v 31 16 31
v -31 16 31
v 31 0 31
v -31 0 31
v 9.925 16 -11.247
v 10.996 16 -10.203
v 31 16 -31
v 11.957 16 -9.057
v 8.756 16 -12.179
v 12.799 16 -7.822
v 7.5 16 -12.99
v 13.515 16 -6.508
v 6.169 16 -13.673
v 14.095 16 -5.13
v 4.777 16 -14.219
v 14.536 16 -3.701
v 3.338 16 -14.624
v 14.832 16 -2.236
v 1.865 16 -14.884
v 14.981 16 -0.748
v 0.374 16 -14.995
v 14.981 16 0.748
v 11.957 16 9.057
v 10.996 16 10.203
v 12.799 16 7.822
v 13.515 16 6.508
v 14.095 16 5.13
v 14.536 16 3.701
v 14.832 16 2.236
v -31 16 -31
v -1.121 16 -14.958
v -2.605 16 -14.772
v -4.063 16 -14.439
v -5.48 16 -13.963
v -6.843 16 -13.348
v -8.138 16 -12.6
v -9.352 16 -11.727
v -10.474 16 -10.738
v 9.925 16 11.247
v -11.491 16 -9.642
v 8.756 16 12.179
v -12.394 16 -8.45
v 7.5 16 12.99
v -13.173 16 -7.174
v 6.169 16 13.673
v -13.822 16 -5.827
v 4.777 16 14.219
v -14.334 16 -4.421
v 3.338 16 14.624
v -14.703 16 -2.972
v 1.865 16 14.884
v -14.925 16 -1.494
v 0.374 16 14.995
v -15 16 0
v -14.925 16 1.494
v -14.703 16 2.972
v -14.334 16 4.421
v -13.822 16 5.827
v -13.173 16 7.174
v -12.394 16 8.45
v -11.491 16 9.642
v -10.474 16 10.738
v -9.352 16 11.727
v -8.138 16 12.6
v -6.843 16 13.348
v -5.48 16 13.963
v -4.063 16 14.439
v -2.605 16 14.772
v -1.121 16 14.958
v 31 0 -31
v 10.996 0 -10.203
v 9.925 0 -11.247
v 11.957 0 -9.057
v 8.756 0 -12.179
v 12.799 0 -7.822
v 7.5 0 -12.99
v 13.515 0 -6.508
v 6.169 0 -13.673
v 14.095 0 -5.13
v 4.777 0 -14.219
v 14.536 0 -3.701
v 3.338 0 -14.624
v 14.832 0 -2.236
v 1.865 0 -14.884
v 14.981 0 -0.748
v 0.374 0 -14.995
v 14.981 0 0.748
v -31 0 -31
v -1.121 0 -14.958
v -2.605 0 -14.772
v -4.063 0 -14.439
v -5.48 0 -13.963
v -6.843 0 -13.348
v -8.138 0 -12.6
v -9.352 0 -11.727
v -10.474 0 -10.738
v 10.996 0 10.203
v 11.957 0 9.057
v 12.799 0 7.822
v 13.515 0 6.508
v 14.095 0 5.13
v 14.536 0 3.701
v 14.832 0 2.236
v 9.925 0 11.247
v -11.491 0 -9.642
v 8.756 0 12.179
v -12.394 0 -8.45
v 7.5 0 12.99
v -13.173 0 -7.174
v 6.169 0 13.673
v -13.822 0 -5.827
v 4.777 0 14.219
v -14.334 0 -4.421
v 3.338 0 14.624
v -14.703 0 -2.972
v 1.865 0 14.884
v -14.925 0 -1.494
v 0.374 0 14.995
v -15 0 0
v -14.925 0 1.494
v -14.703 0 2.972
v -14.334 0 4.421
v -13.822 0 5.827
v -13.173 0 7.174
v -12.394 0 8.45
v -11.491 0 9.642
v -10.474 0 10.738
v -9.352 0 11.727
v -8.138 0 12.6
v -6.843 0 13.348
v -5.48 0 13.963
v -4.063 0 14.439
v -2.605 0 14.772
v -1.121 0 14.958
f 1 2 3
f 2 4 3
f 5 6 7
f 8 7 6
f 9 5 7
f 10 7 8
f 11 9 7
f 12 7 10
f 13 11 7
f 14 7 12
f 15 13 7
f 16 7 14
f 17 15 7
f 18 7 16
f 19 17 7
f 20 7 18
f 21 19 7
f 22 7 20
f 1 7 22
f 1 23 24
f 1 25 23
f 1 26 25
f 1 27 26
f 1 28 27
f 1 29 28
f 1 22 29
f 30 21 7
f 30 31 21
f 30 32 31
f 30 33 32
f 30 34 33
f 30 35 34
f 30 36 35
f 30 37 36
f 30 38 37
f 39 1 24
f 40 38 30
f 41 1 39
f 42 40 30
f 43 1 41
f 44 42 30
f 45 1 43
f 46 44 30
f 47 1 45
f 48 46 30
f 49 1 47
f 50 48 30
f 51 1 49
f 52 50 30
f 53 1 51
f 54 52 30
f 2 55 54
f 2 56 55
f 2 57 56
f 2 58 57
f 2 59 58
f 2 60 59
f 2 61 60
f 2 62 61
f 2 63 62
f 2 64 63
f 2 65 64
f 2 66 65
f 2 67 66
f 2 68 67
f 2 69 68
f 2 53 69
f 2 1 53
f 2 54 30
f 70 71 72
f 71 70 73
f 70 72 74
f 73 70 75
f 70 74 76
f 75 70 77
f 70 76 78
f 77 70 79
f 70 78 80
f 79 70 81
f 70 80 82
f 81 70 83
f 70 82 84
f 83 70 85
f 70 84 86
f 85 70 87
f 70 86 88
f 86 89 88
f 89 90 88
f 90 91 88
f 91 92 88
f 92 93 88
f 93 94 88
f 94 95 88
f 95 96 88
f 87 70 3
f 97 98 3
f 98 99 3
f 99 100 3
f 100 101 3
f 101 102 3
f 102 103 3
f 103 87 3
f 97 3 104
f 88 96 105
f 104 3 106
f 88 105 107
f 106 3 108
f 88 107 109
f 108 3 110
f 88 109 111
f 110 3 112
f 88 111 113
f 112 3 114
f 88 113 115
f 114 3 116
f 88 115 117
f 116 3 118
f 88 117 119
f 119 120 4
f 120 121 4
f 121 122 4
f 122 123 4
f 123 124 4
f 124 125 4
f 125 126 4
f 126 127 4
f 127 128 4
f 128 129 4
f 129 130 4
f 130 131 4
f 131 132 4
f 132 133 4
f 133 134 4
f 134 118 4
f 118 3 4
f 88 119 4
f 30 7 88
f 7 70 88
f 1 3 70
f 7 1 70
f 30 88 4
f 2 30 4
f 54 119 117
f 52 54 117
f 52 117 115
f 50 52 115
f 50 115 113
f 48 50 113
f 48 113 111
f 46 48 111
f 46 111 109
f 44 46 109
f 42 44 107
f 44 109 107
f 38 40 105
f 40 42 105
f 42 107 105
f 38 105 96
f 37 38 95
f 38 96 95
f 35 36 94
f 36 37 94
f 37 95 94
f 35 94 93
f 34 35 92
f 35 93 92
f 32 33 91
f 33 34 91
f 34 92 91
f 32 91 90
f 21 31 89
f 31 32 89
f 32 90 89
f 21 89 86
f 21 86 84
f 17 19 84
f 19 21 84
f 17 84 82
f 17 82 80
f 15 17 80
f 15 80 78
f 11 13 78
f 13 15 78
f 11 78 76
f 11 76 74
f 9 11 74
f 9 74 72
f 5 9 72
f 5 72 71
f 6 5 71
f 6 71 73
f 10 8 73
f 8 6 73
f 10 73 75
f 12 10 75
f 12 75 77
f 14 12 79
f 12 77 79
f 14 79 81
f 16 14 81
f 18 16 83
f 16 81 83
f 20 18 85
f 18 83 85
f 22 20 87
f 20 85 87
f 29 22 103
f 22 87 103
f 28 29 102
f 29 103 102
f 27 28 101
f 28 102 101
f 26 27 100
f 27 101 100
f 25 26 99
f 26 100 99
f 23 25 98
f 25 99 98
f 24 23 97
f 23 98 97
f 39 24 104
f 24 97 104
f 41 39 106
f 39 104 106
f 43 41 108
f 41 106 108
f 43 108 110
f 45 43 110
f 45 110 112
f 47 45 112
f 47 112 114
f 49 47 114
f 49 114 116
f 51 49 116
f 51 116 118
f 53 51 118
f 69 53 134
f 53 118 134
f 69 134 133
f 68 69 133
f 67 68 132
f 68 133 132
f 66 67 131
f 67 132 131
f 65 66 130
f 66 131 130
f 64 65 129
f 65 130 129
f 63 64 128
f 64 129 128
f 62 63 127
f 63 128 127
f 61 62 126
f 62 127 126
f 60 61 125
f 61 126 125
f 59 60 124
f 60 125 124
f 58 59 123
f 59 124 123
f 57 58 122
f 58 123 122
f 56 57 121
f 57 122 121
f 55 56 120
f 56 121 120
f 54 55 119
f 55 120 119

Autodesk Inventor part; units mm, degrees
ref_plane "XZ Plane" through (0, 0, 0) normal (0, 1, 0) x (-1, 0, 0)
sketch "スケッチ1" plane through (0, 0, 0) normal (0, 1, 0) x (-1, 0, 0)
  circle A0 centre (0, 0) radius 15
  line L0 (31, 31) -> (-31, 31)
  line L1 (-31, 31) -> (-31, -31)
  line L2 (-31, -31) -> (31, -31)
  line L3 (31, -31) -> (31, 31)
  line L4 (31, 31) -> (-31, -31) construction
  line L5 (-31, 31) -> (31, -31) construction
  dimension "d0" = 30
  dimension "d1" = 62
  dimension "d2" = 62
extrude "押し出し1" add sketch "スケッチ1" along normal blind 16
properties part number "bearing2b"
